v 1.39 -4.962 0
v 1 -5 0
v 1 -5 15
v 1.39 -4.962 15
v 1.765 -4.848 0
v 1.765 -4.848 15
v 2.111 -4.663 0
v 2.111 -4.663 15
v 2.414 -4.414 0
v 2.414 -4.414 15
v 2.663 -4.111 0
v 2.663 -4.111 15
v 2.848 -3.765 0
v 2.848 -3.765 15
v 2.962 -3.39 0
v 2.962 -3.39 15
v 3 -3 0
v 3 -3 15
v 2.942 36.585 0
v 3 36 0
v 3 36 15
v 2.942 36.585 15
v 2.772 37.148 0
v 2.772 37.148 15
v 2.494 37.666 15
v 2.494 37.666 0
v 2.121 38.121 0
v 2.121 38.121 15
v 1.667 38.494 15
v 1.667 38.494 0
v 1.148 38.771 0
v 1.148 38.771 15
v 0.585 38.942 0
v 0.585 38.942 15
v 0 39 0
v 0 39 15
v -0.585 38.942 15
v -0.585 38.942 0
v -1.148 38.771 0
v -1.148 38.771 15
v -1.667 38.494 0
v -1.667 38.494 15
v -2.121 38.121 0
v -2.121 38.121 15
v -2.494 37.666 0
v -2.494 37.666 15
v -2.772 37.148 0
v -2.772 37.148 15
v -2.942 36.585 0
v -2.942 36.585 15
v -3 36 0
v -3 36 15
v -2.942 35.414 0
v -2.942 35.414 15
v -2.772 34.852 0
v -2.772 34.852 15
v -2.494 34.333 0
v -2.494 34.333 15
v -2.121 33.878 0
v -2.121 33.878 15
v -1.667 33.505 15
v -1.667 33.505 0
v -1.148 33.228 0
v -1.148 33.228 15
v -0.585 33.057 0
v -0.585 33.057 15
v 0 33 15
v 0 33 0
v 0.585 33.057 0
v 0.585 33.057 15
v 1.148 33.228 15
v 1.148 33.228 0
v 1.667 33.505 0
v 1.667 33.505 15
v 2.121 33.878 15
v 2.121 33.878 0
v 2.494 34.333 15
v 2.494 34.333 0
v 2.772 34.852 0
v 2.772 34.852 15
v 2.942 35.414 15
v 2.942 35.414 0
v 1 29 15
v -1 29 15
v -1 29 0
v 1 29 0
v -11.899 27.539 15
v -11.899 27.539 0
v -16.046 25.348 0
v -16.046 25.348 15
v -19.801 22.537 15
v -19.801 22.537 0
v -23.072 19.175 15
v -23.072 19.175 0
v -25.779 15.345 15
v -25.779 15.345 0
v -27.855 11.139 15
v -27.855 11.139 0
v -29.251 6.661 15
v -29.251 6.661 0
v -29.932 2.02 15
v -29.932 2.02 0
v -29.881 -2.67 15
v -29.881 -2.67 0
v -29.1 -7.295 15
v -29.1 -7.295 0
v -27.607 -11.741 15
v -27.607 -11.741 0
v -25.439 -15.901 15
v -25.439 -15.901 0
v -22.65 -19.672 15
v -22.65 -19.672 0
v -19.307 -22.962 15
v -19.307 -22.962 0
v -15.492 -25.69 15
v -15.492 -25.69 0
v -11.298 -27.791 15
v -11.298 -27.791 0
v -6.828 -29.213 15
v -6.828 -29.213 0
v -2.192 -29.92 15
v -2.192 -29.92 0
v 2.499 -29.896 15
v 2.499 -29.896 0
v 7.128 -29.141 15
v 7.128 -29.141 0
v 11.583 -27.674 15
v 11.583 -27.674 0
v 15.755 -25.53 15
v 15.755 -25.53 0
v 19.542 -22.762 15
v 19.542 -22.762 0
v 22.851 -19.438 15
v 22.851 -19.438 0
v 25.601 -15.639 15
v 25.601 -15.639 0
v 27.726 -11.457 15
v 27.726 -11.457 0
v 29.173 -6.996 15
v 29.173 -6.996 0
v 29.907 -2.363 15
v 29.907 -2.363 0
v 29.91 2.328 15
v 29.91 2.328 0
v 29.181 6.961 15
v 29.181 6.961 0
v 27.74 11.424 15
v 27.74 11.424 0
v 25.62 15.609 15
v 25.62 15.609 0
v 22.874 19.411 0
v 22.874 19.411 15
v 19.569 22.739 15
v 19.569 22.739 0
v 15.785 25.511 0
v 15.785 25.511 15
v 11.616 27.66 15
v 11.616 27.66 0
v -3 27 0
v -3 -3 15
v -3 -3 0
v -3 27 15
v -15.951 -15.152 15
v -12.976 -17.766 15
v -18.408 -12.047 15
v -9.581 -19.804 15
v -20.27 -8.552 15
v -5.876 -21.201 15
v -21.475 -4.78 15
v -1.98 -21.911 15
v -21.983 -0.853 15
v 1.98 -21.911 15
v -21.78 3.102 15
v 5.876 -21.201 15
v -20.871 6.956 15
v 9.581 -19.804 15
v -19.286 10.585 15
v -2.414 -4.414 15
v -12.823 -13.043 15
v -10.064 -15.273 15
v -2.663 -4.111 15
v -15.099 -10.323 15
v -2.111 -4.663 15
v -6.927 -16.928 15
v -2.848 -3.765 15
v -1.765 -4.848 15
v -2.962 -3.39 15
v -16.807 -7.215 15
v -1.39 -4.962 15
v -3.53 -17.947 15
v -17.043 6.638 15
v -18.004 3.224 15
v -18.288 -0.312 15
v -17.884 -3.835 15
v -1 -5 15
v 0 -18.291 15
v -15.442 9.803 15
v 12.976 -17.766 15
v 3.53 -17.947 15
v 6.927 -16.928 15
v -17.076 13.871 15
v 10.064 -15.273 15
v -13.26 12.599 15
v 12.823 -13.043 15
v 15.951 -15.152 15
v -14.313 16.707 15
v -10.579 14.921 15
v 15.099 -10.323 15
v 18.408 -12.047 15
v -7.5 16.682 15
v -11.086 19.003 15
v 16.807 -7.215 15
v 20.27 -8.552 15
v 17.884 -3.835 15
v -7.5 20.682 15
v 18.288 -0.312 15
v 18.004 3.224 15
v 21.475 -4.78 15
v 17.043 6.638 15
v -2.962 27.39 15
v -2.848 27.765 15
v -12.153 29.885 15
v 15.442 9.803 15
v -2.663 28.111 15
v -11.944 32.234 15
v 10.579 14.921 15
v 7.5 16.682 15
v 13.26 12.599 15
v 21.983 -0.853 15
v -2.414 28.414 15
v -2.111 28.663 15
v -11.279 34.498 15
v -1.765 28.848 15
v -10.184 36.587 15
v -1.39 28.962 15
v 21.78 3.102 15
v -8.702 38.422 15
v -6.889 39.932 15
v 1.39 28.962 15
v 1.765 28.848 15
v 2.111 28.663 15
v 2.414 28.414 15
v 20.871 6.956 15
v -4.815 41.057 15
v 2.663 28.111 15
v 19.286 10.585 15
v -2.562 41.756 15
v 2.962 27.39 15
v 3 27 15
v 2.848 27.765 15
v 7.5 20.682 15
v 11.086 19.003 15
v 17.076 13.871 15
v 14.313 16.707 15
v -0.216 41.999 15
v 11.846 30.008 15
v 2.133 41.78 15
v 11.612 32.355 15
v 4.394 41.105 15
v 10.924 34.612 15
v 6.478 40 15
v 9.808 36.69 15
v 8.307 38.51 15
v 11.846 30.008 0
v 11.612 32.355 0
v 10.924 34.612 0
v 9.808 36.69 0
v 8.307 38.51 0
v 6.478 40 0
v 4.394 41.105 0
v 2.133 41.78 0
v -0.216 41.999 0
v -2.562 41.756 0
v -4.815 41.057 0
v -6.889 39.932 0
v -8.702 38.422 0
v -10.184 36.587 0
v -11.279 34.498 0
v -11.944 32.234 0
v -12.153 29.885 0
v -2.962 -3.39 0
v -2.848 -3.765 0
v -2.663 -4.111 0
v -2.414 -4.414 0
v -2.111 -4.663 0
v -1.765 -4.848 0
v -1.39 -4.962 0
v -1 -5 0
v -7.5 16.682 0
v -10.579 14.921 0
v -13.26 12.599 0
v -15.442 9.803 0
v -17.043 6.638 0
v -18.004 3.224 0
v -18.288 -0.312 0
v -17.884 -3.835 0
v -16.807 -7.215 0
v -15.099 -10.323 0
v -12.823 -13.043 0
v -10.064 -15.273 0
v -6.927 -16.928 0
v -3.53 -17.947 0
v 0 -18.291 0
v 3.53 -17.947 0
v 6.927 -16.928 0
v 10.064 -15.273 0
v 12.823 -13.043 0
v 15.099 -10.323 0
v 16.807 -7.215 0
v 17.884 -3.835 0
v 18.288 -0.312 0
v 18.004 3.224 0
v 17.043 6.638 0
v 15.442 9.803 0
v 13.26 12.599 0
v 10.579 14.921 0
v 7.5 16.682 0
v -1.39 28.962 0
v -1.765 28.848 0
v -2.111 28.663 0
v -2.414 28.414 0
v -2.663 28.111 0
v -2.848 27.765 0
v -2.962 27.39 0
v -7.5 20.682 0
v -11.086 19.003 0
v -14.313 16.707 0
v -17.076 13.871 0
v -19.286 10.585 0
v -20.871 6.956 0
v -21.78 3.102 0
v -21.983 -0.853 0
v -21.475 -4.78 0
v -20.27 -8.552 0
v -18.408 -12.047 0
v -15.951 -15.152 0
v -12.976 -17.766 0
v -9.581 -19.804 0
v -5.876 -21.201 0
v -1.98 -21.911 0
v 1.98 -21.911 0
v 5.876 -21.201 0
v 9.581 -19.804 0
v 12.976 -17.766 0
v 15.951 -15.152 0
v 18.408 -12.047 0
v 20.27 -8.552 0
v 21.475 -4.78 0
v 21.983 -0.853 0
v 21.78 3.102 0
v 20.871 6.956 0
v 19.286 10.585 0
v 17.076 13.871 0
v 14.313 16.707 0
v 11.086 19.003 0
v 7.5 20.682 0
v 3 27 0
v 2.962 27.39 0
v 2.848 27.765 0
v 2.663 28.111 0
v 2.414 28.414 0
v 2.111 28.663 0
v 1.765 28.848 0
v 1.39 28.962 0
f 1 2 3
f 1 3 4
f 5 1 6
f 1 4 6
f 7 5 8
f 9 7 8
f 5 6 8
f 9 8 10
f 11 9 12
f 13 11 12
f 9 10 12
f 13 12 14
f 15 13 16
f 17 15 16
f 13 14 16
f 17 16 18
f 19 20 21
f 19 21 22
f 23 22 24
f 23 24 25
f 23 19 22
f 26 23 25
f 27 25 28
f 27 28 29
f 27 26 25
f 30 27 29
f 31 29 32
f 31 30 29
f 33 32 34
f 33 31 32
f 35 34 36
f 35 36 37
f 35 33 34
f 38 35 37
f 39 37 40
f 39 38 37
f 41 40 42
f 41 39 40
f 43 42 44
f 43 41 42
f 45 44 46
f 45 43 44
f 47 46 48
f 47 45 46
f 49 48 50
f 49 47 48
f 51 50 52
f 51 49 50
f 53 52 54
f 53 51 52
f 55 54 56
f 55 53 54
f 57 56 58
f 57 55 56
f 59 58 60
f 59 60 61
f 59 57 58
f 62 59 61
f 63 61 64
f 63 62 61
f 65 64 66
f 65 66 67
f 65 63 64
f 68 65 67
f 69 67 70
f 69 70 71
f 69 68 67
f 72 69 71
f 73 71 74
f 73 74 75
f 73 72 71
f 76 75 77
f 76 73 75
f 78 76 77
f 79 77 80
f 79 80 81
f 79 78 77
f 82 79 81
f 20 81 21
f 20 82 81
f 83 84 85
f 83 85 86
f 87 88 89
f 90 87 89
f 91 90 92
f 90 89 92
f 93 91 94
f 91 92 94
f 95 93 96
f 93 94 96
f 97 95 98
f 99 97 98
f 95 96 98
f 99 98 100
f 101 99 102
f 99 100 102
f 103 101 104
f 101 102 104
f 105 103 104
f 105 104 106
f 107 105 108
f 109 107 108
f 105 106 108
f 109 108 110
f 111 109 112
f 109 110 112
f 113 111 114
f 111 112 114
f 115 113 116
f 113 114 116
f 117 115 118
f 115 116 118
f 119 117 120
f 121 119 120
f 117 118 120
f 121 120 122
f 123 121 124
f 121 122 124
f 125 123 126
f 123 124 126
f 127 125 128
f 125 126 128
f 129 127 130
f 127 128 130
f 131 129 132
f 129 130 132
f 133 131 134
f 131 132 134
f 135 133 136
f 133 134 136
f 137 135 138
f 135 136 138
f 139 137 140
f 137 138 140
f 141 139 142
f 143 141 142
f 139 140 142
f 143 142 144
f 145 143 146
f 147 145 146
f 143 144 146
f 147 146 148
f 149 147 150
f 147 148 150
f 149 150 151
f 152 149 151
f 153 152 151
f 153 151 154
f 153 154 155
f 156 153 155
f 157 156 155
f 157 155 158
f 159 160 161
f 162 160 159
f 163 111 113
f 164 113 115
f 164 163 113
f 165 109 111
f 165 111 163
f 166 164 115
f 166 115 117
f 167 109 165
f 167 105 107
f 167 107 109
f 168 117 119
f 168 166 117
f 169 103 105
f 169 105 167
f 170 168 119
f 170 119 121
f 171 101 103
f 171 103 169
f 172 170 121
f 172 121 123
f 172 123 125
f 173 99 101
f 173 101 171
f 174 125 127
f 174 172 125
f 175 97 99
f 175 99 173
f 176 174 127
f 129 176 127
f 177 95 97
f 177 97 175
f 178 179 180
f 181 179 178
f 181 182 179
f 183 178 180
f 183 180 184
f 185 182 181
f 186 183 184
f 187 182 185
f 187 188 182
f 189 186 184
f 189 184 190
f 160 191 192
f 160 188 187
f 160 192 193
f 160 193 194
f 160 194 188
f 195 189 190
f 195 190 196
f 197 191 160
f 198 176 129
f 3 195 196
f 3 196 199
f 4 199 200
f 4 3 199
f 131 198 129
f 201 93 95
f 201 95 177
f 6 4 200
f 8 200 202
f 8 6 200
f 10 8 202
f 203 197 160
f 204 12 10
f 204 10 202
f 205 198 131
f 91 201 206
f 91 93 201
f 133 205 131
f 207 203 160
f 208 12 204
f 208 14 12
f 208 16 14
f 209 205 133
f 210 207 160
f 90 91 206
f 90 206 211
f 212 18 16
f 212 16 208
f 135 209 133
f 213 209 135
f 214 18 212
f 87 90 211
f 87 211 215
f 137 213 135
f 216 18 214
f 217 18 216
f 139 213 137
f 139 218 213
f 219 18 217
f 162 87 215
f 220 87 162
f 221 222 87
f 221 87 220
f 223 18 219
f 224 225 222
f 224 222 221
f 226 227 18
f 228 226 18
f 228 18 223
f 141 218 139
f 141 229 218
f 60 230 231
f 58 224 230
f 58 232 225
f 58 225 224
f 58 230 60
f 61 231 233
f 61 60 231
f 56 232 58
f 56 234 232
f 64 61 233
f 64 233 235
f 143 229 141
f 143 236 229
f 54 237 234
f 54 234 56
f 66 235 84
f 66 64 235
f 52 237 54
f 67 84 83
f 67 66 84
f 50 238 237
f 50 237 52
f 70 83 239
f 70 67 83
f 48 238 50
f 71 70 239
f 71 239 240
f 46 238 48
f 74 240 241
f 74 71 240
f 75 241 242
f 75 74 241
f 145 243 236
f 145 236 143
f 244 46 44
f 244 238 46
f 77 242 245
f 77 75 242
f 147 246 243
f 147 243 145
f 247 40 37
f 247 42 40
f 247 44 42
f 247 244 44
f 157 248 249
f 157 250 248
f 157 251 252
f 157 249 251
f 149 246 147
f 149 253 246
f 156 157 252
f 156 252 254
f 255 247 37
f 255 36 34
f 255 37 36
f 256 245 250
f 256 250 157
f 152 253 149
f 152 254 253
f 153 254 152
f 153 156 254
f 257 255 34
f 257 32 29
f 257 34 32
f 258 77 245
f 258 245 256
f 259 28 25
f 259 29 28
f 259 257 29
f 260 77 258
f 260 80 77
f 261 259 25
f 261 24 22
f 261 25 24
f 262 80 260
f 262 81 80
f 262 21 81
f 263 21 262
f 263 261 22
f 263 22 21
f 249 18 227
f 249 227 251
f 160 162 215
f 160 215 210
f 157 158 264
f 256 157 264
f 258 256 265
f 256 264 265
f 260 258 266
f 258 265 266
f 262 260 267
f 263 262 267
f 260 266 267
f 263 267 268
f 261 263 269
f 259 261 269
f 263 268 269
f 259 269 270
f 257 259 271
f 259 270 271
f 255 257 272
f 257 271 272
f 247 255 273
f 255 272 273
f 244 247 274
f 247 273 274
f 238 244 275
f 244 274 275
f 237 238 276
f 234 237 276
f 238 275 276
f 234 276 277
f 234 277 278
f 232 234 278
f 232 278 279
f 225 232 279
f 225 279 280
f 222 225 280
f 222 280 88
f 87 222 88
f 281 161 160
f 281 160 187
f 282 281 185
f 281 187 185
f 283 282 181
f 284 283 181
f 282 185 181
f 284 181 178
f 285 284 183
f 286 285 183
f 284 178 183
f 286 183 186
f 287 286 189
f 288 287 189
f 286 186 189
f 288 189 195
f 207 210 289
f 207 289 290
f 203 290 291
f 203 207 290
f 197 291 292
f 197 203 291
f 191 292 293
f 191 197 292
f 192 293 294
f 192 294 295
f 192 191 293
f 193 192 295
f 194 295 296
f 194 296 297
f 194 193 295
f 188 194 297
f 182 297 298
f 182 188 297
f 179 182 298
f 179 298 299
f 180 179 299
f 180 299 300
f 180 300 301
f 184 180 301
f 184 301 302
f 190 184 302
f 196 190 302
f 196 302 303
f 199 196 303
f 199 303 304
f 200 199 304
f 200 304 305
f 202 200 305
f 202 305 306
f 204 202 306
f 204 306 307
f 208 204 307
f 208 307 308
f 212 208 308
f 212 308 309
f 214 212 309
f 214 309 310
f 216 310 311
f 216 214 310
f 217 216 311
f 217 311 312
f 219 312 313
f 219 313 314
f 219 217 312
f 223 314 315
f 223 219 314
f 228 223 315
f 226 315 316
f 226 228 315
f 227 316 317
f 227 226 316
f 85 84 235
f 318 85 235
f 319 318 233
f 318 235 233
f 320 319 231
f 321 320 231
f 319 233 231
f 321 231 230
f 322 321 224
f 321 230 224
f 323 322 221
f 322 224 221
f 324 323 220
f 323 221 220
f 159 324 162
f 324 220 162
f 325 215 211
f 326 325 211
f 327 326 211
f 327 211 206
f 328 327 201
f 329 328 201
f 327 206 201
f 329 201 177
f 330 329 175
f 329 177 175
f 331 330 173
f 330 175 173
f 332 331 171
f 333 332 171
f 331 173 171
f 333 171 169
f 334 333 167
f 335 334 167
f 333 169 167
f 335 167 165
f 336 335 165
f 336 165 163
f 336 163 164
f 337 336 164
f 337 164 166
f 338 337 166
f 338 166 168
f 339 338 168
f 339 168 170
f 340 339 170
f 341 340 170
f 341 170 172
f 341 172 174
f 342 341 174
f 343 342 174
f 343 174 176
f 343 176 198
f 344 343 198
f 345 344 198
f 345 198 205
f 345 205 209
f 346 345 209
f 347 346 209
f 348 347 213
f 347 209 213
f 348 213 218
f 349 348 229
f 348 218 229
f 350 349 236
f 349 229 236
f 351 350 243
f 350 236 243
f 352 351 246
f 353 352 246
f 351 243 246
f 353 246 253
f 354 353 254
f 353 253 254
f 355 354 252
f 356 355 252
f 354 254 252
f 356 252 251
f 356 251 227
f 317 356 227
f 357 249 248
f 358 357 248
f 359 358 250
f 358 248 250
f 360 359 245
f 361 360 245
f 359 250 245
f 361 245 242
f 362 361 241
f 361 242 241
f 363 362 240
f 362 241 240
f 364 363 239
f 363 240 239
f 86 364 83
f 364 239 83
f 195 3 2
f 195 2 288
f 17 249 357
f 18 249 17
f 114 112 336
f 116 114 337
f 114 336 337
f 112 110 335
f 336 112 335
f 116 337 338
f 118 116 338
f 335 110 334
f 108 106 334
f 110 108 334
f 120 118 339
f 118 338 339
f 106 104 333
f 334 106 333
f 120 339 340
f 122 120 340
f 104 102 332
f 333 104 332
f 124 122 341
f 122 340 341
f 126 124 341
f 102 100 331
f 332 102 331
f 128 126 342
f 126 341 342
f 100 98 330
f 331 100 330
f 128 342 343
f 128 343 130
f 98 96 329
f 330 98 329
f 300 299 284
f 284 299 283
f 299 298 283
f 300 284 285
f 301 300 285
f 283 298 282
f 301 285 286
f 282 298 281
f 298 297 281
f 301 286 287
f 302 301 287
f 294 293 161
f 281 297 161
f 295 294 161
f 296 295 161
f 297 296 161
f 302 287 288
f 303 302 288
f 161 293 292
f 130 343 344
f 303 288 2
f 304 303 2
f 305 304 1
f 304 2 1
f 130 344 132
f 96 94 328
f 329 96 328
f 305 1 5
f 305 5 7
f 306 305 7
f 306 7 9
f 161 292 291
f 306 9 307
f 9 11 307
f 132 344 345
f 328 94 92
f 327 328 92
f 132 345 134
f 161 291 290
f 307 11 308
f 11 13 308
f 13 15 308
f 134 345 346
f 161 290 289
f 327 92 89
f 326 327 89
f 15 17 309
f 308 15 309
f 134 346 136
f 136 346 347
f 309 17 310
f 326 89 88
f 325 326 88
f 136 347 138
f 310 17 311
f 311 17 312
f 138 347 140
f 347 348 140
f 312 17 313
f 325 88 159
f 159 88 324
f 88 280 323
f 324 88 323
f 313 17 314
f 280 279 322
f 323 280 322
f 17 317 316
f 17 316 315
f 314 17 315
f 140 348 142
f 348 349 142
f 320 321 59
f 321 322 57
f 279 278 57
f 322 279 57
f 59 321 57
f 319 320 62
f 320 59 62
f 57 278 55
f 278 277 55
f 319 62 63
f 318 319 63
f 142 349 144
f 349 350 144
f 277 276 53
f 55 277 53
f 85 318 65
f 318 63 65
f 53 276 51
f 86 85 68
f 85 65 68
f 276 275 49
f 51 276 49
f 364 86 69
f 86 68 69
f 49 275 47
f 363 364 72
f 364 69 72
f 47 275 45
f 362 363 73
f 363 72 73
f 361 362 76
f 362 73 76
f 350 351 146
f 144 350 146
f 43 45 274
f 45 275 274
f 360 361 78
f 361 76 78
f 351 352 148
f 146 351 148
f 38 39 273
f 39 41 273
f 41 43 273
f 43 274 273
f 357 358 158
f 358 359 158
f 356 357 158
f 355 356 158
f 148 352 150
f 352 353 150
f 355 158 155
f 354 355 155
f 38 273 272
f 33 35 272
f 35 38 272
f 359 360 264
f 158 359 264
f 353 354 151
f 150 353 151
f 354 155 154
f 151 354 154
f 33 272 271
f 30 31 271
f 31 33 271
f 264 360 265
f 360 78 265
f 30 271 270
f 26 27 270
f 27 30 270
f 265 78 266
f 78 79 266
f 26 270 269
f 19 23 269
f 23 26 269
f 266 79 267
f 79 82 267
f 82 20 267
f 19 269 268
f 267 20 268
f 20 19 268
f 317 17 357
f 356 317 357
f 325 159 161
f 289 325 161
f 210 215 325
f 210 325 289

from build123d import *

# Parameters (mm, degrees)
SKETCH_R     = 3
PAD_DEPTH    = 15
POCKET_DEPTH = 15.001


with BuildPart() as part:
    # Sketch → Pad (new body)
    with BuildSketch(Plane.XY):
        with BuildLine():
            ThreePointArc((-11.899095, 27.539273), (0.154021, -29.999605), (11.615696, 27.66))
            ThreePointArc((11.615696, 27.66), (-0.21563, 41.999446), (-11.899095, 27.539273))
        make_face()
        with Locations((0, 35.999605)):
            Circle(SKETCH_R, mode=Mode.SUBTRACT)
    extrude(amount=PAD_DEPTH)

    # Sketch001 (on Face5 of Pad) → Pocket (cut, through all)
    with BuildSketch(Plane.XY.offset(15)):
        with BuildLine():
            ThreePointArc((-7.5, 20.682118), (0, -22), (7.5, 20.682118))
            Line((7.5, 20.682118), (7.5, 16.682118))
            ThreePointArc((-7.5, 16.682118), (0, -18.290518), (7.5, 16.682118))
            Line((-7.5, 20.682118), (-7.5, 16.682118))
        make_face()
        with BuildLine():
            Line((-1, 29), (1, 29))
            ThreePointArc((3, 27), (2.414214, 28.414214), (1, 29))
            Line((3, 27), (3, -3))
            ThreePointArc((1, -5), (2.414214, -4.414214), (3, -3))
            Line((1, -5), (-1, -5))
            ThreePointArc((-3, -3), (-2.414214, -4.414214), (-1, -5))
            Line((-3, -3), (-3, 27))
            ThreePointArc((-1, 29), (-2.414214, 28.414214), (-3, 27))
        make_face()
    extrude(amount=-POCKET_DEPTH, mode=Mode.SUBTRACT)


solid = part.part
